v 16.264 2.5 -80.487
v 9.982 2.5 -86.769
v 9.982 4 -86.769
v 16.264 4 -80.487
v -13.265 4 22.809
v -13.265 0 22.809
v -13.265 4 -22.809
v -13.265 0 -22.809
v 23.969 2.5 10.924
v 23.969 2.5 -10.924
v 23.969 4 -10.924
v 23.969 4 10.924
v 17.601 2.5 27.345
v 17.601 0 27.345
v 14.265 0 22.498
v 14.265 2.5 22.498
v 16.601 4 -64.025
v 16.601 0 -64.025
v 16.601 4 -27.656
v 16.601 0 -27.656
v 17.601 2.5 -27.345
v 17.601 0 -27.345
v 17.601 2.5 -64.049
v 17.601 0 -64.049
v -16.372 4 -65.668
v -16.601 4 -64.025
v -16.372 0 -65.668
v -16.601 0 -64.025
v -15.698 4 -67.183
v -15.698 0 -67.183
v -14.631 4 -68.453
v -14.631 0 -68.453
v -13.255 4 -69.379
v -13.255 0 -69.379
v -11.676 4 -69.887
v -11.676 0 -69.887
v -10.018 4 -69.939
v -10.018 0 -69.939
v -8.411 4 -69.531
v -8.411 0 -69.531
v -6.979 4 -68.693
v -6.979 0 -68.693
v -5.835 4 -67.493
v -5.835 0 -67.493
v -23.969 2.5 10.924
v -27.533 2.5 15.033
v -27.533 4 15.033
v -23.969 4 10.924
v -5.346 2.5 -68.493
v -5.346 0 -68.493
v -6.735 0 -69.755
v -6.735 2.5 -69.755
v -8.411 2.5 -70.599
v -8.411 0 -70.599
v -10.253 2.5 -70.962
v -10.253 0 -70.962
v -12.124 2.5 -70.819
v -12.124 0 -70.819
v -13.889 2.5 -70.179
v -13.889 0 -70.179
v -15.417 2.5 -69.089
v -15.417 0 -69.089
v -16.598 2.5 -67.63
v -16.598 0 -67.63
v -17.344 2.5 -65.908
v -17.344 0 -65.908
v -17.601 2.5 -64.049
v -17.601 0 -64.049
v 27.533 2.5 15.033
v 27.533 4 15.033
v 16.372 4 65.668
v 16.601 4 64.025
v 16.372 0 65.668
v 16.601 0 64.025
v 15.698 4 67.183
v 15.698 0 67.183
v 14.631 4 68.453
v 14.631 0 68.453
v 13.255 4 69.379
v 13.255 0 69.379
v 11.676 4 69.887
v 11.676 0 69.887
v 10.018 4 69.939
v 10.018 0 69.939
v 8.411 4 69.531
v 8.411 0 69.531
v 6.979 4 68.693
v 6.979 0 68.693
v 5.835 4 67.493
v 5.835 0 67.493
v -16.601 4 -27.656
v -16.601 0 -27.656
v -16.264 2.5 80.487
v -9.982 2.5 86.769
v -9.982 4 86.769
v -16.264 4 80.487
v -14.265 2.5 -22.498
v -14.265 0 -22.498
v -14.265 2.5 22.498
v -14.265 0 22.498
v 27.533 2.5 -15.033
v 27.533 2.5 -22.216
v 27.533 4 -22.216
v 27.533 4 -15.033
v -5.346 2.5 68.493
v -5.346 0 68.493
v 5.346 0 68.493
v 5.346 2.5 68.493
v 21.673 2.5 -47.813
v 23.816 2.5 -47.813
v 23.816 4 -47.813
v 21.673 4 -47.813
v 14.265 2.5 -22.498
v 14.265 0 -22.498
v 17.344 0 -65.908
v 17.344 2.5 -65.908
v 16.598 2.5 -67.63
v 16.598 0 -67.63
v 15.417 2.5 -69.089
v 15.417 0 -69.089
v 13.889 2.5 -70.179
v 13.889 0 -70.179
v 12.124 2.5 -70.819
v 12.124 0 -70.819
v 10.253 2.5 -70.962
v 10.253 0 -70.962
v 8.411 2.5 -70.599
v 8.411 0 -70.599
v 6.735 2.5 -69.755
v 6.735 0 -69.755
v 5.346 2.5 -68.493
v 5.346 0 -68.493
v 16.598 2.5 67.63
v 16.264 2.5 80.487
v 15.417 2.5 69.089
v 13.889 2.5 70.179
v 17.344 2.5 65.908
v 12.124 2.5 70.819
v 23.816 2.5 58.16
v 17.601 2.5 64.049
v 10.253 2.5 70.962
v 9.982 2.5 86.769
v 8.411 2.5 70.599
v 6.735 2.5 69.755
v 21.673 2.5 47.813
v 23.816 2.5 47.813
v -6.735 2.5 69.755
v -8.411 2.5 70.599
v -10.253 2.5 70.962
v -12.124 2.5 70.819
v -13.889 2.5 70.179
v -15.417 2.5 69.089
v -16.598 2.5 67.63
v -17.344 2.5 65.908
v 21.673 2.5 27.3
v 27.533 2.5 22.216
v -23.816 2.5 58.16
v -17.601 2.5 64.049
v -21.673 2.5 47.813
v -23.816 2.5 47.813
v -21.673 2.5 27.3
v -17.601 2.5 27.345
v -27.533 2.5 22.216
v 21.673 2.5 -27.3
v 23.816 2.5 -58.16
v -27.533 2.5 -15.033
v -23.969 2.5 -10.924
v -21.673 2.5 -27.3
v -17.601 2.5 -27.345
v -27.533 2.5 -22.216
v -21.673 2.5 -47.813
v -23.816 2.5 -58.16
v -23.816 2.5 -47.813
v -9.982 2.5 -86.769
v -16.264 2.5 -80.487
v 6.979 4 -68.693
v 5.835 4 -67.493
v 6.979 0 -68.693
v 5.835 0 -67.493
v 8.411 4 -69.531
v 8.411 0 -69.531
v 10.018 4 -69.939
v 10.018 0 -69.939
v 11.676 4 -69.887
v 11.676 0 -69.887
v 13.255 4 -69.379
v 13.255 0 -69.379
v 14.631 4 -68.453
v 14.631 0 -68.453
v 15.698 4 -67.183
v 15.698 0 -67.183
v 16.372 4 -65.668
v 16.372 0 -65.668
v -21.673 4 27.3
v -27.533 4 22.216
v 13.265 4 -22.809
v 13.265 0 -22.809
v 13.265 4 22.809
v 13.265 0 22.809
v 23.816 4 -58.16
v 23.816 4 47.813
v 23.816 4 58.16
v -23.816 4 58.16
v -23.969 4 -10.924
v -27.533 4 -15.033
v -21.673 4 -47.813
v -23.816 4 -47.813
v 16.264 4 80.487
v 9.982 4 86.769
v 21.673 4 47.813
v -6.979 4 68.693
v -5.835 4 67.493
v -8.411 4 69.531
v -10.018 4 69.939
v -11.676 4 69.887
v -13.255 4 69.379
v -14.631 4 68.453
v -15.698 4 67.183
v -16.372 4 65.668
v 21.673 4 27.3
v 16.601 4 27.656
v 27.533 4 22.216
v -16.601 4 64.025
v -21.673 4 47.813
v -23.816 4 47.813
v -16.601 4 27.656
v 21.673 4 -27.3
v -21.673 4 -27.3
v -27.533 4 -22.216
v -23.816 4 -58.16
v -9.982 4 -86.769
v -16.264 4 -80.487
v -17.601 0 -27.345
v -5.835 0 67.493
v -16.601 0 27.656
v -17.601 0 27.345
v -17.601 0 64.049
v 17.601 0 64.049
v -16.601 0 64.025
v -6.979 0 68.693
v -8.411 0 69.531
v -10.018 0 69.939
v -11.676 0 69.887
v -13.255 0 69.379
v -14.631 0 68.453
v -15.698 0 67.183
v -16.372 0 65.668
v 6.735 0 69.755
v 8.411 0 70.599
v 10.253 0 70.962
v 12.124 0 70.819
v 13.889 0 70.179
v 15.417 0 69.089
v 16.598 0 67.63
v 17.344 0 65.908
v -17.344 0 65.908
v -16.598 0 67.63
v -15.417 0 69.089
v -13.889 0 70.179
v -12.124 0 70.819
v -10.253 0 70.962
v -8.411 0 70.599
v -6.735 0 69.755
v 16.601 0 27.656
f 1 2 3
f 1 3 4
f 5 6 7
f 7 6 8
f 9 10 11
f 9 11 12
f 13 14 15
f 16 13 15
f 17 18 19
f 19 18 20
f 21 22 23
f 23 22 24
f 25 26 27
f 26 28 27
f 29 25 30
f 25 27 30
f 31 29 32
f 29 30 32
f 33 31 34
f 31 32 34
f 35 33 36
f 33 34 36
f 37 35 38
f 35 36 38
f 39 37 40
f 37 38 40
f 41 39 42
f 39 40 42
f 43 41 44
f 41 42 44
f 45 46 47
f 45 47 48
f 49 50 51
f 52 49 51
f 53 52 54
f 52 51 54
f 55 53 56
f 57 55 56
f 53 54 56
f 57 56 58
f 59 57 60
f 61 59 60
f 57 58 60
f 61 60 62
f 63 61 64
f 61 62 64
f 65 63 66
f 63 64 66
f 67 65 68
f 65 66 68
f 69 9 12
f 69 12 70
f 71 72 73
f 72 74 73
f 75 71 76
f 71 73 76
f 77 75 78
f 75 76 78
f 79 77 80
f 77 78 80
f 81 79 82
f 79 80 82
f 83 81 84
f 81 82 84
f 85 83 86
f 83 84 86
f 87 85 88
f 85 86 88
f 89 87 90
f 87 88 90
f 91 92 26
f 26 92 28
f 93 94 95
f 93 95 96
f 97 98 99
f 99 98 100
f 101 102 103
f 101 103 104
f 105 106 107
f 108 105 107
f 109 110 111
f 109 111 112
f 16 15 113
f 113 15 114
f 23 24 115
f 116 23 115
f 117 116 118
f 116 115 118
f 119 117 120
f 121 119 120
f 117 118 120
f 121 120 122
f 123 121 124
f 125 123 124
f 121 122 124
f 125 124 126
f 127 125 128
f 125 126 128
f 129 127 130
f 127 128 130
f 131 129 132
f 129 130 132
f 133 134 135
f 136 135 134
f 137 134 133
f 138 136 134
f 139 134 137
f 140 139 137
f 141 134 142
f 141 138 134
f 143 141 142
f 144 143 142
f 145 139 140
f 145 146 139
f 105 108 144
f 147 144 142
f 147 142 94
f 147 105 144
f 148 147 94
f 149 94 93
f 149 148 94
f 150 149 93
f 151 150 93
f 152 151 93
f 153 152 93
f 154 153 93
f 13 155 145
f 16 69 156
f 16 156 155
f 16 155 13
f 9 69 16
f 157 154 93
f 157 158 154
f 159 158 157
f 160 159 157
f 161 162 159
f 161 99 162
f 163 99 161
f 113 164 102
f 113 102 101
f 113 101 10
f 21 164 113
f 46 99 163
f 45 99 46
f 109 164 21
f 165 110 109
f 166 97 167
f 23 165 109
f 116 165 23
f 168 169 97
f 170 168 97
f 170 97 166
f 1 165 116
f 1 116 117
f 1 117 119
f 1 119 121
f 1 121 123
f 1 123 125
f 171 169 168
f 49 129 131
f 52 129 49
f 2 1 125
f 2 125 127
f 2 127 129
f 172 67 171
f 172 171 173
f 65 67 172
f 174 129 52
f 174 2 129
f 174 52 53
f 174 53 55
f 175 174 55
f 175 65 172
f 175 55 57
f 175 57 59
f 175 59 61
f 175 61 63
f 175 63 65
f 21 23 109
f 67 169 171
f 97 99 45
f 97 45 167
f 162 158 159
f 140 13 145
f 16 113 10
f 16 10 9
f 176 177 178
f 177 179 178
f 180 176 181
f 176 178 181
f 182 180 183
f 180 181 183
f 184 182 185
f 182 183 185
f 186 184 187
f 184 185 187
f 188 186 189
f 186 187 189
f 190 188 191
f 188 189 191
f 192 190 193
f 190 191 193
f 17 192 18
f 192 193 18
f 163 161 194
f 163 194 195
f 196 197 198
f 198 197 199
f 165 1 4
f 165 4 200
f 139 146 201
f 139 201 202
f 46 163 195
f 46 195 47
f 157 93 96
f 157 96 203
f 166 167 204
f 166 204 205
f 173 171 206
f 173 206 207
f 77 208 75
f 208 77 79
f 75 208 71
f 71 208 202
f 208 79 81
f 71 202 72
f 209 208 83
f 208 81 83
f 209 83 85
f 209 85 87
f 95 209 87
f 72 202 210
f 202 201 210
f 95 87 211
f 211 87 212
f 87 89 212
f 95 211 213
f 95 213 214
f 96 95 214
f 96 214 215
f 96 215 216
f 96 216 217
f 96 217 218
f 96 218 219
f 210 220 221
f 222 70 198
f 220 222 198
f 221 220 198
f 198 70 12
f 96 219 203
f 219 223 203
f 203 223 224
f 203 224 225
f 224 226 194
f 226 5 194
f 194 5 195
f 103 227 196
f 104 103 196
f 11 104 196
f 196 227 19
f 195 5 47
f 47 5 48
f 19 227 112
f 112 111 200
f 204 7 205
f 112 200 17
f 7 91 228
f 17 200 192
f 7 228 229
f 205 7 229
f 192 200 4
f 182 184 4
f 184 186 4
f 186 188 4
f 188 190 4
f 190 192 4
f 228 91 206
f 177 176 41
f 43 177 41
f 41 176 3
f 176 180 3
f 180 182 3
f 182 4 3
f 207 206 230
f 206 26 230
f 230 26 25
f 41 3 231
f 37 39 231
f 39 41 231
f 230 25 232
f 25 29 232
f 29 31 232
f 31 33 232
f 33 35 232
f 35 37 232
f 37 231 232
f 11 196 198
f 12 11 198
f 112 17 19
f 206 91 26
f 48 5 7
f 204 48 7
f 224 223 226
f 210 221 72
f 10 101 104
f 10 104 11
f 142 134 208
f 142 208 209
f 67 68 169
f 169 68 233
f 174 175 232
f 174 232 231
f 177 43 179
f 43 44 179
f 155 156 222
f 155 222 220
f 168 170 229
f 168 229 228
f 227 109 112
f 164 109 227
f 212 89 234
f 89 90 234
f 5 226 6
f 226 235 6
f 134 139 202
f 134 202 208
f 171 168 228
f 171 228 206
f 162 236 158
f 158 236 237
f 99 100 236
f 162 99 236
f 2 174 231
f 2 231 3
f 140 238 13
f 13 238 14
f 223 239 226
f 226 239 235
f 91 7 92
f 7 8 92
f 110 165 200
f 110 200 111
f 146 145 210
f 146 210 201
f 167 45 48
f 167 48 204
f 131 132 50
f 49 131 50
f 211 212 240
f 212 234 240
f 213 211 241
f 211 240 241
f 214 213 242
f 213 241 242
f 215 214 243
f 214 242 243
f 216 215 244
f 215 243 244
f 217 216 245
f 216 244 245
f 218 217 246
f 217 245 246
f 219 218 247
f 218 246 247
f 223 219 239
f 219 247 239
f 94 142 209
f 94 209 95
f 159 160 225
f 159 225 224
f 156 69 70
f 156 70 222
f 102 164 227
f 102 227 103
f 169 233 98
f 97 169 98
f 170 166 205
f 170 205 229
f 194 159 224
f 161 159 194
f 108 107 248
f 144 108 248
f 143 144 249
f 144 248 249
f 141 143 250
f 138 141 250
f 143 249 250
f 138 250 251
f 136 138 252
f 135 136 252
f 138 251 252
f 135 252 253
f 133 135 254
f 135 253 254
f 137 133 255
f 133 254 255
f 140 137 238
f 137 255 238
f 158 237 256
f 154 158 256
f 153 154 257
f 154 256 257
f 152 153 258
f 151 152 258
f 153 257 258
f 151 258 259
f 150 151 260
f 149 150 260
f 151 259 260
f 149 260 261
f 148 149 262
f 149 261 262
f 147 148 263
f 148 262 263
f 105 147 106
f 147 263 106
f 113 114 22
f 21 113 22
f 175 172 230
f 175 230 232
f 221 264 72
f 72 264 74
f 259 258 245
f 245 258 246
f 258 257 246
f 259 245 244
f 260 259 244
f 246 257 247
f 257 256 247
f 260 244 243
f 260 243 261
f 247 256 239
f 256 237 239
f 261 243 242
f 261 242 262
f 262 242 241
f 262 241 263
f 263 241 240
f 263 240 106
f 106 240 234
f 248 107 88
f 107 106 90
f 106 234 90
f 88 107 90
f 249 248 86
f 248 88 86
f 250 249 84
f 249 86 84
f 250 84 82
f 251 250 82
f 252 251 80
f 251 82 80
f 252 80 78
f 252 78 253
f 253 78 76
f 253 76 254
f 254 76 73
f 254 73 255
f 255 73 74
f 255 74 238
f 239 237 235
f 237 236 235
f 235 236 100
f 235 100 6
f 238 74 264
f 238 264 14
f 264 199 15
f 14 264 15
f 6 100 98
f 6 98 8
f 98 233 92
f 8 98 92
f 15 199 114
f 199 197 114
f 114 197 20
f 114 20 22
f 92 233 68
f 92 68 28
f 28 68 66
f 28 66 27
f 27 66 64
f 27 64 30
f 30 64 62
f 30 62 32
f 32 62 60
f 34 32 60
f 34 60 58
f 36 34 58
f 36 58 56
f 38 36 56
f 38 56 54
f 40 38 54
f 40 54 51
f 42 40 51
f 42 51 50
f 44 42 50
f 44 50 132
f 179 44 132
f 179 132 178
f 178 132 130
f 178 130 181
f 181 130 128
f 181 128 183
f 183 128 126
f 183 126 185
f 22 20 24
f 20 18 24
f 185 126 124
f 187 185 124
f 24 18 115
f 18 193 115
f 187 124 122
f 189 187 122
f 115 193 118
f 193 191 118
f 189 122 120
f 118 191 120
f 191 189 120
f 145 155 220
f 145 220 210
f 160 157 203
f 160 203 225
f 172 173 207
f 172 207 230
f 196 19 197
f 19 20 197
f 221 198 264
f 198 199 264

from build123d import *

# Parameters (mm, degrees)
BOSS_EXTRUDE1_DEPTH = 2.5
BOSS_EXTRUDE3_DEPTH = 1.5


# Read off the part's stored shape, not the designer's step: Boss-Extrude1
with BuildPart() as part:
    # Boss-Extrude1 outline → Boss-Extrude1 (new body)
    with BuildSketch(Plane(origin=(0, 0, 0), x_dir=(1, 0, 0), z_dir=(0, 1, 0))):
        with BuildLine():
            ThreePointArc((17.600819084, 64.048530094), (13.028302904, 70.558621532), (5.345717729, 68.492930418))
            Line((5.345717729, 68.492930418), (-5.345717729, 68.492930418))
            ThreePointArc((-5.345717729, 68.492930418), (-13.028302904, 70.558621532), (-17.600819084, 64.048530094))
            Line((-17.600819084, 64.048530094), (-17.600819084, 27.344801488))
            Line((-17.600819084, 27.344801488), (-14.264554689, 22.498047837))
            Line((-14.264554689, 22.498047837), (-14.264554689, -22.498047837))
            Line((-14.264554689, -22.498047837), (-17.600819084, -27.344801488))
            Line((-17.600819084, -27.344801488), (-17.600819084, -64.048530094))
            ThreePointArc((-17.600819084, -64.048530094), (-13.028302904, -70.558621532), (-5.345717729, -68.492930418))
            Line((-5.345717729, -68.492930418), (5.345717729, -68.492930418))
            ThreePointArc((5.345717729, -68.492930418), (13.028302904, -70.558621532), (17.600819084, -64.048530094))
            Line((17.600819084, -64.048530094), (17.600819084, -27.344801488))
            Line((17.600819084, -27.344801488), (14.264554689, -22.498047837))
            Line((14.264554689, -22.498047837), (14.264554689, 22.498047837))
            Line((14.264554689, 22.498047837), (17.600819084, 27.344801488))
            Line((17.600819084, 27.344801488), (17.600819084, 64.048530094))
        make_face()
        with BuildLine():
            Line((16.600819084, -27.655707745), (16.600819084, -64.025237528))
            ThreePointArc((16.600819084, -64.025237528), (12.483449957, -69.688325839), (5.834875923, -67.492930418))
            Line((5.834875923, -67.492930418), (-5.834875923, -67.492930418))
            ThreePointArc((-5.834875923, -67.492930418), (-12.483449957, -69.688325839), (-16.600819084, -64.025237528))
            Line((-16.600819084, -64.025237528), (-16.600819084, -27.655707745))
            Line((-16.600819084, -27.655707745), (-13.264554689, -22.808954094))
            Line((-13.264554689, -22.808954094), (-13.264554689, 22.808954094))
            Line((-13.264554689, 22.808954094), (-16.600819084, 27.655707745))
            Line((-16.600819084, 27.655707745), (-16.600819084, 64.025237528))
            ThreePointArc((-16.600819084, 64.025237528), (-12.483449957, 69.688325839), (-5.834875923, 67.492930418))
            Line((-5.834875923, 67.492930418), (5.834875923, 67.492930418))
            ThreePointArc((5.834875923, 67.492930418), (12.483449957, 69.688325839), (16.600819084, 64.025237528))
            Line((16.600819084, 64.025237528), (16.600819084, 27.655707745))
            Line((16.600819084, 27.655707745), (13.264554689, 22.808954094))
            Line((13.264554689, 22.808954094), (13.264554689, -22.808954094))
            Line((13.264554689, -22.808954094), (16.600819084, -27.655707745))
        make_face(mode=Mode.SUBTRACT)
    extrude(amount=BOSS_EXTRUDE1_DEPTH)

    # Sketch4 → Boss-Extrude3 (add)
    with BuildSketch(Plane(origin=(0, 2.5, 0), x_dir=(1, 0, 0), z_dir=(0, 1, 0))):
        Polygon((-9.982037134, 86.769350006), (9.982037134, 86.769350006), (16.264456892, 80.486930248), (23.81578312, 58.16008483), (23.81578312, 47.812822946), (21.672882272, 47.812822946), (21.672882272, 27.300144084), (27.53346101, 22.216178317), (27.53346101, 15.033319747), (23.968939697, 10.924291721), (23.968939697, -10.924291721), (27.53346101, -15.033319747), (27.53346101, -22.216178317), (21.672882272, -27.300144084), (21.672882272, -47.812822946), (23.81578312, -47.812822946), (23.81578312, -58.16008483), (16.264456892, -80.486930248), (9.982037134, -86.769350006), (-9.982037134, -86.769350006), (-16.264456892, -80.486930248), (-23.81578312, -58.16008483), (-23.81578312, -47.812822946), (-21.672882272, -47.812822946), (-21.672882272, -27.300144084), (-27.53346101, -22.216178317), (-27.53346101, -15.033319747), (-23.968939697, -10.924291721), (-23.968939697, 10.924291721), (-27.53346101, 15.033319747), (-27.53346101, 22.216178317), (-21.672882272, 27.300144084), (-21.672882272, 47.812822946), (-23.81578312, 47.812822946), (-23.81578312, 58.16008483), (-16.264456892, 80.486930248), align=None)
        with BuildLine():
            Line((13.264554689, 22.808954094), (13.264554689, -22.808954094))
            Line((13.264554689, -22.808954094), (16.600819084, -27.655707745))
            Line((16.600819084, -27.655707745), (16.600819084, -64.025237528))
            ThreePointArc((16.600819084, -64.025237528), (12.483449957, -69.688325839), (5.834875923, -67.492930418))
            Line((5.834875923, -67.492930418), (-5.834875923, -67.492930418))
            ThreePointArc((-5.834875923, -67.492930418), (-12.483449957, -69.688325839), (-16.600819084, -64.025237528))
            Line((-16.600819084, -64.025237528), (-16.600819084, -27.655707745))
            Line((-16.600819084, -27.655707745), (-13.264554689, -22.808954094))
            Line((-13.264554689, -22.808954094), (-13.264554689, 22.808954094))
            Line((-13.264554689, 22.808954094), (-16.600819084, 27.655707745))
            Line((-16.600819084, 27.655707745), (-16.600819084, 64.025237528))
            ThreePointArc((-16.600819084, 64.025237528), (-12.483449957, 69.688325839), (-5.834875923, 67.492930418))
            Line((-5.834875923, 67.492930418), (5.834875923, 67.492930418))
            ThreePointArc((5.834875923, 67.492930418), (12.483449957, 69.688325839), (16.600819084, 64.025237528))
            Line((16.600819084, 64.025237528), (16.600819084, 27.655707745))
            Line((16.600819084, 27.655707745), (13.264554689, 22.808954094))
        make_face(mode=Mode.SUBTRACT)
    extrude(amount=BOSS_EXTRUDE3_DEPTH)


solid = part.part
